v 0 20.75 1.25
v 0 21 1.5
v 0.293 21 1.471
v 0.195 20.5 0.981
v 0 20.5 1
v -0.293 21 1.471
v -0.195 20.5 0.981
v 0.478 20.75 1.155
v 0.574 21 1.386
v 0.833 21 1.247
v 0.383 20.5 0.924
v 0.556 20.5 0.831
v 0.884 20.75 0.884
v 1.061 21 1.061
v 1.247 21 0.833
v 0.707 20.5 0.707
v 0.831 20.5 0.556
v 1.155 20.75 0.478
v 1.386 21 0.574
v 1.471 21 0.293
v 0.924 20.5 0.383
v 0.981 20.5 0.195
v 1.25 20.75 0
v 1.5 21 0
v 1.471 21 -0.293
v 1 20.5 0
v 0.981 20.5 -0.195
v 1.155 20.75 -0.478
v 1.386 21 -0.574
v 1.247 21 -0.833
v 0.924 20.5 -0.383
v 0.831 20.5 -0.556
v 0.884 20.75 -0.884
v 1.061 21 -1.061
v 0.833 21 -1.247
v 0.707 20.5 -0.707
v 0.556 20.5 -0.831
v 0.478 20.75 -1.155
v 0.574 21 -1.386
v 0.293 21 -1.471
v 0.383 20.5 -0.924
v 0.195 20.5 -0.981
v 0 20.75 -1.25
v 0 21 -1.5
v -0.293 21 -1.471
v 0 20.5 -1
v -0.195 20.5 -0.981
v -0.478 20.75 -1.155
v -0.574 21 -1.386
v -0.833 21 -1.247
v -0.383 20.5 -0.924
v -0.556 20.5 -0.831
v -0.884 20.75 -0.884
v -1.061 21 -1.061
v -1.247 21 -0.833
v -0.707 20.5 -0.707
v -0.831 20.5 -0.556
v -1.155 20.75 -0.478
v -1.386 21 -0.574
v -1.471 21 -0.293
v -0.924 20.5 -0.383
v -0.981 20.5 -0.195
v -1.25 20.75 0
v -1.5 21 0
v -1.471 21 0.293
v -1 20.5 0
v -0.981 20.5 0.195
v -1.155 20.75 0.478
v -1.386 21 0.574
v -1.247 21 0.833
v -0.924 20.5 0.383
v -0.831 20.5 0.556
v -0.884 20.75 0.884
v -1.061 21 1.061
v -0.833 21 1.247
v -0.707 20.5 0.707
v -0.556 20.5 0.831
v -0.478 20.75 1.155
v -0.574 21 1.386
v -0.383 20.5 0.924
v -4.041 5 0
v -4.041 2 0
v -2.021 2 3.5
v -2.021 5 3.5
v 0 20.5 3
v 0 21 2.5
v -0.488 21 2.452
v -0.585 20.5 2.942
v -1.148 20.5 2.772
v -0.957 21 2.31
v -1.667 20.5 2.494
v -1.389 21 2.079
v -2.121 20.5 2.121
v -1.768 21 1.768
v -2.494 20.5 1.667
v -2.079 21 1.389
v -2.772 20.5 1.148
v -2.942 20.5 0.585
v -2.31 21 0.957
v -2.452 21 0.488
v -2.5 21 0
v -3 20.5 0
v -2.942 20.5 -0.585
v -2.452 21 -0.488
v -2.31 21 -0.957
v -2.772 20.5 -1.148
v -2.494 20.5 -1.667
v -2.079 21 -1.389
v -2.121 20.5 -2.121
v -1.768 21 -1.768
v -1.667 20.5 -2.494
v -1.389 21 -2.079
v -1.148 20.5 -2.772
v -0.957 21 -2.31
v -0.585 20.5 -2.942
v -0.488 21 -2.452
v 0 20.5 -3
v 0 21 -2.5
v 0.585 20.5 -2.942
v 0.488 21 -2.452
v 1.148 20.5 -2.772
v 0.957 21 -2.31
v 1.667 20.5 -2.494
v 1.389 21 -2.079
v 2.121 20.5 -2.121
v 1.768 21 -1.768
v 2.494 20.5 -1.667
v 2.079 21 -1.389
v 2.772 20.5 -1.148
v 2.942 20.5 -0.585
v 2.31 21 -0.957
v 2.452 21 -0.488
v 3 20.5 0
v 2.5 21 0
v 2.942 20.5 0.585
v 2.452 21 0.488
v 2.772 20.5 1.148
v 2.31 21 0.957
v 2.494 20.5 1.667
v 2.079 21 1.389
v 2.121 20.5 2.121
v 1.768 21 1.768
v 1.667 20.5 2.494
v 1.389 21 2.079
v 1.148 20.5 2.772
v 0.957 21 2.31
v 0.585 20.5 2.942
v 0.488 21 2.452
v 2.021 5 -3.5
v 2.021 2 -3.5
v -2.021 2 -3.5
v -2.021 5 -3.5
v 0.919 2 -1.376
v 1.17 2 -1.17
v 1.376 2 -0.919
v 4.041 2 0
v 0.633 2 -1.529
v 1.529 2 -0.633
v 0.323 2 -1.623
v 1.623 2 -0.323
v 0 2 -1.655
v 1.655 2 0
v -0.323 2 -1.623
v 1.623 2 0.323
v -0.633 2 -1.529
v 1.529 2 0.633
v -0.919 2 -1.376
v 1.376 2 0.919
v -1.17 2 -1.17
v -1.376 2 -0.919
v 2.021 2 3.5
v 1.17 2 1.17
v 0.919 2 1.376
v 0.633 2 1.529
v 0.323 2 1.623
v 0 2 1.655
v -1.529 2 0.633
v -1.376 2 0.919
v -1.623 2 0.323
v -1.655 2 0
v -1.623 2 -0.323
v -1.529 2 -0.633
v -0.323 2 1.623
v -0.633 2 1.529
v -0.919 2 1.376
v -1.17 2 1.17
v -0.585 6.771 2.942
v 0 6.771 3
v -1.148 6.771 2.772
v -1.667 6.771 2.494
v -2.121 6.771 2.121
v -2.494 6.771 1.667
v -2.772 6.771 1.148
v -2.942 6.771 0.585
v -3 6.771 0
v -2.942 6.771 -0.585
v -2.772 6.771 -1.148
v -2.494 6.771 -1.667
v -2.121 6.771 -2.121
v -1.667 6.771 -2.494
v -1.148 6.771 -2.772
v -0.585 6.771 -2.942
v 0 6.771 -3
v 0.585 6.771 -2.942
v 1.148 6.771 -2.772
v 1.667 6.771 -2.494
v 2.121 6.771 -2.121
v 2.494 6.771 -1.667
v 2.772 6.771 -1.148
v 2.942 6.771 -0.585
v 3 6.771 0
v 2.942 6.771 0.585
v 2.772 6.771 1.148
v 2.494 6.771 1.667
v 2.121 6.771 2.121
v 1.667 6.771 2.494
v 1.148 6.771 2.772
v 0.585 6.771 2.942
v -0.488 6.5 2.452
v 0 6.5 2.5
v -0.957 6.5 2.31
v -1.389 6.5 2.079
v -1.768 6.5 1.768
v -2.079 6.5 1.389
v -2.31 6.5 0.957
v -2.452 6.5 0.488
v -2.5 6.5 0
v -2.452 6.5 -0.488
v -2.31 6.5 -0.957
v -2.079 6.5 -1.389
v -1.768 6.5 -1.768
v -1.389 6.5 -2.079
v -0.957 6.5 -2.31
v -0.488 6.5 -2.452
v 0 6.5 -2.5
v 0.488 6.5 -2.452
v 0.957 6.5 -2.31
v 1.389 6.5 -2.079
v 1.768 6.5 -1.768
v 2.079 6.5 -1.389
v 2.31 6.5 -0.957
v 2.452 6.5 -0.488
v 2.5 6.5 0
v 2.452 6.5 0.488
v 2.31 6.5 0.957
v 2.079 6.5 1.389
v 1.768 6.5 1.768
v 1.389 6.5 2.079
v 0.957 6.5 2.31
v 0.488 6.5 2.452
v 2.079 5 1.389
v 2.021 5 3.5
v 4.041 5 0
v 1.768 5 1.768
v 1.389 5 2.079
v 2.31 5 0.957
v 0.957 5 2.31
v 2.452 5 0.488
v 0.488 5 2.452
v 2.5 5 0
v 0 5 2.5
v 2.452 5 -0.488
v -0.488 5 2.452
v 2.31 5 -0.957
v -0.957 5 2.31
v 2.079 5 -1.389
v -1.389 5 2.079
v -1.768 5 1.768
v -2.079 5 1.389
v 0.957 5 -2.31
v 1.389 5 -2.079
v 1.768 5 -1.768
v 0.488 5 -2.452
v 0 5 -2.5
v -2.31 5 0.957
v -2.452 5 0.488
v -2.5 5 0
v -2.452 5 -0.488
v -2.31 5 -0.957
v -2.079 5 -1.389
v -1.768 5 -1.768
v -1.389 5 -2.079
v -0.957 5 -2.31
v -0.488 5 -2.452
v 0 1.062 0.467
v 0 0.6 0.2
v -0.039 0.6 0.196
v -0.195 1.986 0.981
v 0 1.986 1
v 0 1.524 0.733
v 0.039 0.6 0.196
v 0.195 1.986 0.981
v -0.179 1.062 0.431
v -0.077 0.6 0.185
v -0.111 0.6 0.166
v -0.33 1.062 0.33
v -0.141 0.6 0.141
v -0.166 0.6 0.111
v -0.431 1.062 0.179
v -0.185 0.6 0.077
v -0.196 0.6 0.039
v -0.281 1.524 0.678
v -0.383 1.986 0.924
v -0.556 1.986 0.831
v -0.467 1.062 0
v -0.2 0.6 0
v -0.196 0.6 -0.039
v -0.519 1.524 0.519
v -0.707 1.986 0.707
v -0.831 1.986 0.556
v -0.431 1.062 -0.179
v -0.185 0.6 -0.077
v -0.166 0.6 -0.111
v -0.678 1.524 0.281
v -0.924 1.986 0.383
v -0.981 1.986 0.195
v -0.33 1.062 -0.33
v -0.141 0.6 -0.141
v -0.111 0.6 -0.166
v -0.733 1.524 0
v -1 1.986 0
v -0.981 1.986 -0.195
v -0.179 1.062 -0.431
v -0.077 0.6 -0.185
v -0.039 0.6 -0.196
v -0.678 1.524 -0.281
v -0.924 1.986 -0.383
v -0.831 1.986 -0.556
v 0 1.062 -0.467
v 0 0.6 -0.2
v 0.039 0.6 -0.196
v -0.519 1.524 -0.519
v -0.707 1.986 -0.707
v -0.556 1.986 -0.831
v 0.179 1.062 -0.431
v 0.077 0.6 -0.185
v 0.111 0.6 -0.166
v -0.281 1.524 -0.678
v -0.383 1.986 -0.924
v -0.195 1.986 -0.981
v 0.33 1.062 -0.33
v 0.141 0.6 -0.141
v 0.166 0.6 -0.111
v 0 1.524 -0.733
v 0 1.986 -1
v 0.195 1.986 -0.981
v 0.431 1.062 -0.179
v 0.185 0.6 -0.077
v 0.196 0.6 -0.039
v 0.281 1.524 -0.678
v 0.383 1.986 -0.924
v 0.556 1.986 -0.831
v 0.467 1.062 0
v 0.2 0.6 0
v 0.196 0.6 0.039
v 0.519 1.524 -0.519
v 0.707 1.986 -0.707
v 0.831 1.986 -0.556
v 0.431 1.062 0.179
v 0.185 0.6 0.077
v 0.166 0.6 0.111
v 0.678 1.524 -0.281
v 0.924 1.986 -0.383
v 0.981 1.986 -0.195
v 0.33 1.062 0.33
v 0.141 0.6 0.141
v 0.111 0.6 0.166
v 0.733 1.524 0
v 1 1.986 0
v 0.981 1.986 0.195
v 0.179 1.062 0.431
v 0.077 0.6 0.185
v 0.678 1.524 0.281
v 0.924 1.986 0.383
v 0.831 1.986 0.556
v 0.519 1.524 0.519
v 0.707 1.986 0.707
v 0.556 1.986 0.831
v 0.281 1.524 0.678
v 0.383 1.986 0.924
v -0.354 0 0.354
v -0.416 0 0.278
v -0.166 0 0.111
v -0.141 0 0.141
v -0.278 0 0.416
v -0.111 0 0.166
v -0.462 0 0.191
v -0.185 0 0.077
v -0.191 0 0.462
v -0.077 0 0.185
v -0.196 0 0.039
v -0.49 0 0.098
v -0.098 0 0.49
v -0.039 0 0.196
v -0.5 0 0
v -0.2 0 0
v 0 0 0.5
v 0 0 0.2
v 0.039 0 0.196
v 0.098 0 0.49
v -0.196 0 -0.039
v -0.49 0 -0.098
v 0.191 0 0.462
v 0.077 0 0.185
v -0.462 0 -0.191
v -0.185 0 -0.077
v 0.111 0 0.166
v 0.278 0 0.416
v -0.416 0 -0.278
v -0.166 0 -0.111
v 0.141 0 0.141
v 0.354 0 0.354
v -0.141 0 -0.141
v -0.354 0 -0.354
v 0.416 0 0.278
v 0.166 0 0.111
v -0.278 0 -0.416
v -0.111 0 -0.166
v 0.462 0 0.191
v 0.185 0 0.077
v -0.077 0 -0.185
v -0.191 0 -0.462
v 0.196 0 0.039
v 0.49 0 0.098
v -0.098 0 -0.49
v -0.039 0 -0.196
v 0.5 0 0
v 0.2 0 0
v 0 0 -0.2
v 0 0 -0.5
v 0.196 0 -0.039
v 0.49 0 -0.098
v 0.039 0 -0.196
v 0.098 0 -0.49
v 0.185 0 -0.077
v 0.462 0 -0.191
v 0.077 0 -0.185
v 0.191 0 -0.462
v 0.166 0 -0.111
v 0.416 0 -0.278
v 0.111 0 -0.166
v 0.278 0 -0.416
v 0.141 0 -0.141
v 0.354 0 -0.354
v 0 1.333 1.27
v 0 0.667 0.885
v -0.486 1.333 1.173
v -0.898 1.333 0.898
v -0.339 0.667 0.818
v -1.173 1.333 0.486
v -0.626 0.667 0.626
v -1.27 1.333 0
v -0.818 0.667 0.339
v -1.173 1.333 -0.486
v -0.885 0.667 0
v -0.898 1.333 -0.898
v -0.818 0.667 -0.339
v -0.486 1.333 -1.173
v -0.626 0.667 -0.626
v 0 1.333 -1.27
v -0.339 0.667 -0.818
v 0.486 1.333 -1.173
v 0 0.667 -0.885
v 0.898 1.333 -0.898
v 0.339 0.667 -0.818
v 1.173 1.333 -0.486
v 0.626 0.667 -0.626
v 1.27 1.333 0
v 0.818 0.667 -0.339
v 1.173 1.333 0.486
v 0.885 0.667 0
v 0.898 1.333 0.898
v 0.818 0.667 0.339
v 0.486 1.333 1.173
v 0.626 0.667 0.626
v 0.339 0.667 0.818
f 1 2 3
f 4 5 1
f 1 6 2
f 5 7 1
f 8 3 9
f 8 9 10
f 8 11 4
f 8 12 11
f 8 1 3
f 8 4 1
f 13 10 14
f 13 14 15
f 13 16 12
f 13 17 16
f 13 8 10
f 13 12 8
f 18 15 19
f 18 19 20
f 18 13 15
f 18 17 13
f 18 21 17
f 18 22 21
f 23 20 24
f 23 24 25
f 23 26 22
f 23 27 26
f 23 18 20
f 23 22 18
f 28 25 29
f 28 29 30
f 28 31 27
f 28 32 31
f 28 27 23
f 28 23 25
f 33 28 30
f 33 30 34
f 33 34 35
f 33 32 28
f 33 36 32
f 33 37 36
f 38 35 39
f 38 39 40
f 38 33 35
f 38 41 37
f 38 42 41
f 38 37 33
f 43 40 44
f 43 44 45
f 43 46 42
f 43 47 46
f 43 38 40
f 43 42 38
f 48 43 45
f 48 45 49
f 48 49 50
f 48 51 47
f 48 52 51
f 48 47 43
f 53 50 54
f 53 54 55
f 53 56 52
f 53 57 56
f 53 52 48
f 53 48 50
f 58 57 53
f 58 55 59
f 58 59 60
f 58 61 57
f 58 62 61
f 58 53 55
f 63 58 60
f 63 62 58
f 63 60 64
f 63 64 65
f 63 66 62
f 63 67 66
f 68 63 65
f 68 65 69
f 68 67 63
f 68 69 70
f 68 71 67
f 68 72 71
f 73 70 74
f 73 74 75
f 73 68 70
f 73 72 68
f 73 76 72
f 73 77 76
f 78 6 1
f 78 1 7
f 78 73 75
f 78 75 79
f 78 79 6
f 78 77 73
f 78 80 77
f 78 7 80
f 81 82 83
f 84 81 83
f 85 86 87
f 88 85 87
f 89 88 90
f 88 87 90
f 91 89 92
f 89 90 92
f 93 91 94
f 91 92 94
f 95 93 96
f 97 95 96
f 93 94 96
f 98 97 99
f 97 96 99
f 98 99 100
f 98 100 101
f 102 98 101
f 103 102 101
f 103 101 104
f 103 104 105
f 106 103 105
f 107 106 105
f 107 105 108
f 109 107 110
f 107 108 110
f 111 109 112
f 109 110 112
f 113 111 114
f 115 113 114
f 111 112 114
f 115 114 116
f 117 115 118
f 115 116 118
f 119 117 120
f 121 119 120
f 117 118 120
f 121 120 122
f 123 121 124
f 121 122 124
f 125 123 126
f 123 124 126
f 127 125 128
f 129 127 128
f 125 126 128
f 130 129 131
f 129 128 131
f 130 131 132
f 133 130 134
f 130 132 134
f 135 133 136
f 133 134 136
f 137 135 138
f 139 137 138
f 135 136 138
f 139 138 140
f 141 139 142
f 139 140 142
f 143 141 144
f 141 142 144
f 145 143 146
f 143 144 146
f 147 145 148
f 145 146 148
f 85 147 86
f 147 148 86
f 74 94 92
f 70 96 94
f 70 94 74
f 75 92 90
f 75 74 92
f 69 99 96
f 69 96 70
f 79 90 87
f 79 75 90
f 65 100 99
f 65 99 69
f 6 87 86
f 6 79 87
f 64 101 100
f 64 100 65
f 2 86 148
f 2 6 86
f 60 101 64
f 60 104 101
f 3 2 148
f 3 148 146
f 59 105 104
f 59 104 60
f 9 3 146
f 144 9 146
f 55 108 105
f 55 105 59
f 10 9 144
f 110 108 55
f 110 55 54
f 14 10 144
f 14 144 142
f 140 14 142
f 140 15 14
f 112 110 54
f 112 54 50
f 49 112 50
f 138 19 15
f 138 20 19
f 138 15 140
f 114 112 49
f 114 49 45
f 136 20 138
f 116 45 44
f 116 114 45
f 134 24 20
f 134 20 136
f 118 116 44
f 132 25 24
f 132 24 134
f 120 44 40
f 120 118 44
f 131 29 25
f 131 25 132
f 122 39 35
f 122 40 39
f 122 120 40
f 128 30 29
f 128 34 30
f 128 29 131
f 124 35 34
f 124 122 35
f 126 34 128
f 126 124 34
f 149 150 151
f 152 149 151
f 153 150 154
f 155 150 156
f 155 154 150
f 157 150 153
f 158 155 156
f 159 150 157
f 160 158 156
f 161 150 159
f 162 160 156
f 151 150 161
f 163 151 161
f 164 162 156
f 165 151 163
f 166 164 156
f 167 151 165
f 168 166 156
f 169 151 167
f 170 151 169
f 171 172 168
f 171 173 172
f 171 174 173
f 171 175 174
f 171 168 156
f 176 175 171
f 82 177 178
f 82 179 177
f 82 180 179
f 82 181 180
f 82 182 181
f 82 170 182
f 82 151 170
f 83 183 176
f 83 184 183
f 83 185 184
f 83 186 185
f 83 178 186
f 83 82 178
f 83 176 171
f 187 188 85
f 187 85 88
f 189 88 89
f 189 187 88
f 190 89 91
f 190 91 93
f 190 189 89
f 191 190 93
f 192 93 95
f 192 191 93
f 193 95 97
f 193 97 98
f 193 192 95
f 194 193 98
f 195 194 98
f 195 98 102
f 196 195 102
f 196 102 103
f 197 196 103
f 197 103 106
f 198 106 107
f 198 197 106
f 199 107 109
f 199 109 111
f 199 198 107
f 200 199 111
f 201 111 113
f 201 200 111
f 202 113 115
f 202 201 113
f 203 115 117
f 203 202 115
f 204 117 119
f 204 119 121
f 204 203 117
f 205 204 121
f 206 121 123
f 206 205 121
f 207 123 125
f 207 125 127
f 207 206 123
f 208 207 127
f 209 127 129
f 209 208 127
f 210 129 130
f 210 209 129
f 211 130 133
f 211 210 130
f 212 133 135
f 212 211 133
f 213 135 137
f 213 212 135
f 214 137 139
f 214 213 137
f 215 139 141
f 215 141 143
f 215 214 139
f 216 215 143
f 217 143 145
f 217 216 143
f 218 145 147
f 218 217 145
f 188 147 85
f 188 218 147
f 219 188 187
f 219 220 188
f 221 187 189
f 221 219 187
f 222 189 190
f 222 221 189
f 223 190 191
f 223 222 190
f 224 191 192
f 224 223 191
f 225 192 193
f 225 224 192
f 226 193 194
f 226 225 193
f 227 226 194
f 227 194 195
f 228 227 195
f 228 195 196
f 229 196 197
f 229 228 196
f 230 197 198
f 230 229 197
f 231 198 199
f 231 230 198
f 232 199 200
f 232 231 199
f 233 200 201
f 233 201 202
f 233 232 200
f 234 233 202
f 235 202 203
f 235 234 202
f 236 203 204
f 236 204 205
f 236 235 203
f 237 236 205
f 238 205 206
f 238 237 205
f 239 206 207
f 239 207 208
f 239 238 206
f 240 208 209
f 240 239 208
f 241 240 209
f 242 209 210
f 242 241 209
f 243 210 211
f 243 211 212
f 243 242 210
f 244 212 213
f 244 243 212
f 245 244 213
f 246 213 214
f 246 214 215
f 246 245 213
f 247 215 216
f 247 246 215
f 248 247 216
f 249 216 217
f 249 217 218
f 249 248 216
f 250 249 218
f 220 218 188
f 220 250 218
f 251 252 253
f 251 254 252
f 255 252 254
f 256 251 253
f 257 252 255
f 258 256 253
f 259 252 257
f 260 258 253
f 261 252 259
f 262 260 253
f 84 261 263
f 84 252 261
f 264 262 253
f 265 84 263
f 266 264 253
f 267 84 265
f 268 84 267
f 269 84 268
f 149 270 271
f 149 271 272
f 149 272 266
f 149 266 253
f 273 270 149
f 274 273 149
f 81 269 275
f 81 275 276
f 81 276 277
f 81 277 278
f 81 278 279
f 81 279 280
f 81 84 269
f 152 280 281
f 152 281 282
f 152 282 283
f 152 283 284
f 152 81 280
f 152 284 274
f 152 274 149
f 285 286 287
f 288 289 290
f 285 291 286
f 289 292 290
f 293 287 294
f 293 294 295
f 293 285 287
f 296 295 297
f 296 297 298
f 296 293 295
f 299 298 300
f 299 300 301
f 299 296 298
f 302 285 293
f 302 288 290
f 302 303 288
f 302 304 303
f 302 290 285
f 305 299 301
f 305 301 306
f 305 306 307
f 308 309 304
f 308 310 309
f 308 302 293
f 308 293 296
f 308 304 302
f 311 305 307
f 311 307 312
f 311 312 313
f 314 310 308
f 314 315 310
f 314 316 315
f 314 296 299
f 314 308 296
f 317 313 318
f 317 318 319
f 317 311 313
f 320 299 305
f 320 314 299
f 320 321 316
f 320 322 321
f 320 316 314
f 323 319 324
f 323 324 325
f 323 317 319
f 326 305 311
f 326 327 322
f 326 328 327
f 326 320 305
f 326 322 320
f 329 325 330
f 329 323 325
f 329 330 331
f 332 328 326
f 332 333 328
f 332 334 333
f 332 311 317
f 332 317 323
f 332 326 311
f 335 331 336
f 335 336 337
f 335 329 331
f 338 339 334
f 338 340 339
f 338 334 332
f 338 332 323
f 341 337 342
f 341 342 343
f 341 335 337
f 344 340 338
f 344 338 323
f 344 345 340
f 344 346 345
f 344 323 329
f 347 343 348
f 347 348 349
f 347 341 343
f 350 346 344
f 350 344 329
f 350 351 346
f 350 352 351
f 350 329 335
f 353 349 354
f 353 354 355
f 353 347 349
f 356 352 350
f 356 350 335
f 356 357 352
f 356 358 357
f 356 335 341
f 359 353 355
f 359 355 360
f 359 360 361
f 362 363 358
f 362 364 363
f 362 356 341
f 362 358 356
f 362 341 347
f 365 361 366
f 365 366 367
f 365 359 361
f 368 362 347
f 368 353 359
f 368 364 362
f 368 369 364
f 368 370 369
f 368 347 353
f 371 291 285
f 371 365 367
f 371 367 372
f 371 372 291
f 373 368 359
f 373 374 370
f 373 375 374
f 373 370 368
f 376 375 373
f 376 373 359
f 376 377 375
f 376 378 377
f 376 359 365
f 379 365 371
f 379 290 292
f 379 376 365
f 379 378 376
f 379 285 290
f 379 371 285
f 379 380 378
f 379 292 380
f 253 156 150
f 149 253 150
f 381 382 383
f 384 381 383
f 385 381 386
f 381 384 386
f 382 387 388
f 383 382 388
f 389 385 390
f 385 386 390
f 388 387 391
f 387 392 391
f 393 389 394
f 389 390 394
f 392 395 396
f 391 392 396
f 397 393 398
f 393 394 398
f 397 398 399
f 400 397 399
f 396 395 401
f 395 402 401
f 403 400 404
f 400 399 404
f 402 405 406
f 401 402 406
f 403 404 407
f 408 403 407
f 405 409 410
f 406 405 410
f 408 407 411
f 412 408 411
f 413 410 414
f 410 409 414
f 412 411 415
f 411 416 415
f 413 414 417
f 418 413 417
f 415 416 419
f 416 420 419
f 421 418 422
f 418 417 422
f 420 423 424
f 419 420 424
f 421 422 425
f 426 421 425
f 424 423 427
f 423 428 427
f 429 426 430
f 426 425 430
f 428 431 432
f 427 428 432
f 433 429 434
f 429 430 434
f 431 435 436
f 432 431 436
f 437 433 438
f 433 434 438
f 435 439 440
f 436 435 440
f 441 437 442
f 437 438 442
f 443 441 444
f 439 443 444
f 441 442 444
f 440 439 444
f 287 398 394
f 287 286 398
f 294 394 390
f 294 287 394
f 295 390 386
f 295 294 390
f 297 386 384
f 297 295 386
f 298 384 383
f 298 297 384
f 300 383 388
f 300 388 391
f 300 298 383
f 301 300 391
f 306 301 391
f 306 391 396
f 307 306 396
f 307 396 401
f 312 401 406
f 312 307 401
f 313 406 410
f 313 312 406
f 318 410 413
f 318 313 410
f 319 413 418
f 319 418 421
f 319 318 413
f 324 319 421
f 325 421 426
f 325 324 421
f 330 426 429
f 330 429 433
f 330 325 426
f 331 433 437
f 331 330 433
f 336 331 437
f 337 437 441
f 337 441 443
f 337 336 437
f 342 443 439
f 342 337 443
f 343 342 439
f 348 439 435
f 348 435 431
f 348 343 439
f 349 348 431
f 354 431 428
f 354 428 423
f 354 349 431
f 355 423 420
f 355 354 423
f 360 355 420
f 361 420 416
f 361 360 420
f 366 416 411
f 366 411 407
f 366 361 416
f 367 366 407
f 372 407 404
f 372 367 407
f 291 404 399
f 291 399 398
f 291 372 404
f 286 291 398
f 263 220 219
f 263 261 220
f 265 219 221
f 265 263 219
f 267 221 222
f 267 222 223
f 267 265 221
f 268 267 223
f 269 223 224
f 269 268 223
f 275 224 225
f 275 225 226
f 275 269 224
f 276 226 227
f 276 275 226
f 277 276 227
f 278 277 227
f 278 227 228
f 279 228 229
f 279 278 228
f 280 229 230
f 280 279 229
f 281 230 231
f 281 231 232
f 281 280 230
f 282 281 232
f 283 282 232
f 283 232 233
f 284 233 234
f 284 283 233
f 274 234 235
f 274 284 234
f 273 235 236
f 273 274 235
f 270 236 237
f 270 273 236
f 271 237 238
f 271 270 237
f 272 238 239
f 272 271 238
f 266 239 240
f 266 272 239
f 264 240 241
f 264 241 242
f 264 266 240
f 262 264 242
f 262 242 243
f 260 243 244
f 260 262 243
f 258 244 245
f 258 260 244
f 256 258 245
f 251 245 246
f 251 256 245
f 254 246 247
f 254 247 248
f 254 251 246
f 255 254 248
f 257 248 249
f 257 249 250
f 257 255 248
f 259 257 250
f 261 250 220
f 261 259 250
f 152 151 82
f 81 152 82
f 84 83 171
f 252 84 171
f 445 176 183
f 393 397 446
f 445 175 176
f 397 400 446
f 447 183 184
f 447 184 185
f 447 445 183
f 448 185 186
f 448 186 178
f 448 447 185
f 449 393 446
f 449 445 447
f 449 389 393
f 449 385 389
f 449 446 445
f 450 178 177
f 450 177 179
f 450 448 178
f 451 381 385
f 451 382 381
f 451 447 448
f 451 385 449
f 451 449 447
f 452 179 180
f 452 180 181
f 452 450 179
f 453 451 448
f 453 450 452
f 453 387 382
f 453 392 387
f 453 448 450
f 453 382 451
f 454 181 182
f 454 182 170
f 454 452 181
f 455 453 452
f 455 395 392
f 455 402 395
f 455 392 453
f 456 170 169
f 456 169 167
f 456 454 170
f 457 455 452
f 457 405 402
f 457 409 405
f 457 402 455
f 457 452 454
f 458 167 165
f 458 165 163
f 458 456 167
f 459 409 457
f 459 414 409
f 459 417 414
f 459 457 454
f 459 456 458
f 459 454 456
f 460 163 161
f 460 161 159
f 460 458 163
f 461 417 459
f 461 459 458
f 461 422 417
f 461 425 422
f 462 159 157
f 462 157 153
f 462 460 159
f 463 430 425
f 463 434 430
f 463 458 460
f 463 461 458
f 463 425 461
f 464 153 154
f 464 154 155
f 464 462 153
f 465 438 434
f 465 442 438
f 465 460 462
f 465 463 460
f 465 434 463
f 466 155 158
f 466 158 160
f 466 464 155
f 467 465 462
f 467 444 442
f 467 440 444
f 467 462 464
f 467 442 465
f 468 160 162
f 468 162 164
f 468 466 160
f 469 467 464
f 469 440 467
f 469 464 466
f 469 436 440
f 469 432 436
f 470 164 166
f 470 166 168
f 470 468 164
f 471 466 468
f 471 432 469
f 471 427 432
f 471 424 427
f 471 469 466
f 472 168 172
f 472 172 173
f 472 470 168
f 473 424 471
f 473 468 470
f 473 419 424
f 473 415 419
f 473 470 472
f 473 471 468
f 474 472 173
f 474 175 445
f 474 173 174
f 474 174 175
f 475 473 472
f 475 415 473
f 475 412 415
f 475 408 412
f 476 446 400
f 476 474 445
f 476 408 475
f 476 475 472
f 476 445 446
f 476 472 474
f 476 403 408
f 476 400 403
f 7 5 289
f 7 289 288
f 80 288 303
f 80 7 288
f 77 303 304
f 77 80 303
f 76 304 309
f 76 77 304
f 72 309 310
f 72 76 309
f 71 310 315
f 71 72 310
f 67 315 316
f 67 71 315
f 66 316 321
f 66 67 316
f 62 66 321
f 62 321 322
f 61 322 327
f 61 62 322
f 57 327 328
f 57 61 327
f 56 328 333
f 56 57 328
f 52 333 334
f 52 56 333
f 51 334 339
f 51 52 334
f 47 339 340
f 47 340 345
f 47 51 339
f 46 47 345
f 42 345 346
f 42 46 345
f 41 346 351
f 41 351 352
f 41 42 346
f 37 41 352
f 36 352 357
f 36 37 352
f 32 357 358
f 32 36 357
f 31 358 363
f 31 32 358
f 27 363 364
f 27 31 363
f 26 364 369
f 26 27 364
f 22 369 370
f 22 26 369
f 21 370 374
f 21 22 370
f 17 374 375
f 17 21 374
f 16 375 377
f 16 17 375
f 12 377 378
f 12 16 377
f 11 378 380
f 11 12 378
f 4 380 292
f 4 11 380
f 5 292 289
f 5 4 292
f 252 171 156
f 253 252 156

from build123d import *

# Parameters (mm, degrees)
BOSS_EXTRUDE1_DEPTH = 21
CHAMFER1_SIZE       = 0.5


with BuildPart() as part:
    # Sketch1 → Boss-Extrude1 (new body)
    with BuildSketch(Plane(origin=(0, 0, 0), x_dir=(1, 0, 0), z_dir=(0, 1, 0))):
        Polygon((4.041451884, 0), (2.020725942, 3.5), (-2.020725942, 3.5), (-4.041451884, 0), (-2.020725942, -3.5), (2.020725942, -3.5), align=None)
    extrude(amount=BOSS_EXTRUDE1_DEPTH)

    # Sketch2 → Cut-Revolve1 (revolve, cut)
    with BuildSketch(Plane.XY, mode=Mode.PRIVATE) as cut_revolve1_sk:
        Polygon((-1, 1.985640646), (-1, 21.445867252), (0, 21.445867252), (0, 0), (-0.2, 0), (-0.2, 0.6), align=None)
        Polygon((-3, 22.847292178), (-3, 6.770566956), (-2.5, 6.5), (-2.5, 5), (-6.012196156, 5), (-6.012196156, 2), (-1.654700538, 2), (-0.5, 0), (-0.5, -1.473098258), (-7.184398373, -1.473098258), (-7.184398373, 22.847292178), align=None)
    revolve(cut_revolve1_sk.sketch.rotate(Axis((0, 22.126511162, 0), (0, -1, 0)), 270), axis=Axis((0, 22.126511162, 0), (0, -1, 0)), mode=Mode.SUBTRACT)

    # Chamfer1
    chamfer1_edges = [part.edges().sort_by_distance(p)[0] for p in [
        (0, 21, -1),
        (0, 21, -3),
    ]]
    chamfer(chamfer1_edges, length=CHAMFER1_SIZE)


solid = part.part
